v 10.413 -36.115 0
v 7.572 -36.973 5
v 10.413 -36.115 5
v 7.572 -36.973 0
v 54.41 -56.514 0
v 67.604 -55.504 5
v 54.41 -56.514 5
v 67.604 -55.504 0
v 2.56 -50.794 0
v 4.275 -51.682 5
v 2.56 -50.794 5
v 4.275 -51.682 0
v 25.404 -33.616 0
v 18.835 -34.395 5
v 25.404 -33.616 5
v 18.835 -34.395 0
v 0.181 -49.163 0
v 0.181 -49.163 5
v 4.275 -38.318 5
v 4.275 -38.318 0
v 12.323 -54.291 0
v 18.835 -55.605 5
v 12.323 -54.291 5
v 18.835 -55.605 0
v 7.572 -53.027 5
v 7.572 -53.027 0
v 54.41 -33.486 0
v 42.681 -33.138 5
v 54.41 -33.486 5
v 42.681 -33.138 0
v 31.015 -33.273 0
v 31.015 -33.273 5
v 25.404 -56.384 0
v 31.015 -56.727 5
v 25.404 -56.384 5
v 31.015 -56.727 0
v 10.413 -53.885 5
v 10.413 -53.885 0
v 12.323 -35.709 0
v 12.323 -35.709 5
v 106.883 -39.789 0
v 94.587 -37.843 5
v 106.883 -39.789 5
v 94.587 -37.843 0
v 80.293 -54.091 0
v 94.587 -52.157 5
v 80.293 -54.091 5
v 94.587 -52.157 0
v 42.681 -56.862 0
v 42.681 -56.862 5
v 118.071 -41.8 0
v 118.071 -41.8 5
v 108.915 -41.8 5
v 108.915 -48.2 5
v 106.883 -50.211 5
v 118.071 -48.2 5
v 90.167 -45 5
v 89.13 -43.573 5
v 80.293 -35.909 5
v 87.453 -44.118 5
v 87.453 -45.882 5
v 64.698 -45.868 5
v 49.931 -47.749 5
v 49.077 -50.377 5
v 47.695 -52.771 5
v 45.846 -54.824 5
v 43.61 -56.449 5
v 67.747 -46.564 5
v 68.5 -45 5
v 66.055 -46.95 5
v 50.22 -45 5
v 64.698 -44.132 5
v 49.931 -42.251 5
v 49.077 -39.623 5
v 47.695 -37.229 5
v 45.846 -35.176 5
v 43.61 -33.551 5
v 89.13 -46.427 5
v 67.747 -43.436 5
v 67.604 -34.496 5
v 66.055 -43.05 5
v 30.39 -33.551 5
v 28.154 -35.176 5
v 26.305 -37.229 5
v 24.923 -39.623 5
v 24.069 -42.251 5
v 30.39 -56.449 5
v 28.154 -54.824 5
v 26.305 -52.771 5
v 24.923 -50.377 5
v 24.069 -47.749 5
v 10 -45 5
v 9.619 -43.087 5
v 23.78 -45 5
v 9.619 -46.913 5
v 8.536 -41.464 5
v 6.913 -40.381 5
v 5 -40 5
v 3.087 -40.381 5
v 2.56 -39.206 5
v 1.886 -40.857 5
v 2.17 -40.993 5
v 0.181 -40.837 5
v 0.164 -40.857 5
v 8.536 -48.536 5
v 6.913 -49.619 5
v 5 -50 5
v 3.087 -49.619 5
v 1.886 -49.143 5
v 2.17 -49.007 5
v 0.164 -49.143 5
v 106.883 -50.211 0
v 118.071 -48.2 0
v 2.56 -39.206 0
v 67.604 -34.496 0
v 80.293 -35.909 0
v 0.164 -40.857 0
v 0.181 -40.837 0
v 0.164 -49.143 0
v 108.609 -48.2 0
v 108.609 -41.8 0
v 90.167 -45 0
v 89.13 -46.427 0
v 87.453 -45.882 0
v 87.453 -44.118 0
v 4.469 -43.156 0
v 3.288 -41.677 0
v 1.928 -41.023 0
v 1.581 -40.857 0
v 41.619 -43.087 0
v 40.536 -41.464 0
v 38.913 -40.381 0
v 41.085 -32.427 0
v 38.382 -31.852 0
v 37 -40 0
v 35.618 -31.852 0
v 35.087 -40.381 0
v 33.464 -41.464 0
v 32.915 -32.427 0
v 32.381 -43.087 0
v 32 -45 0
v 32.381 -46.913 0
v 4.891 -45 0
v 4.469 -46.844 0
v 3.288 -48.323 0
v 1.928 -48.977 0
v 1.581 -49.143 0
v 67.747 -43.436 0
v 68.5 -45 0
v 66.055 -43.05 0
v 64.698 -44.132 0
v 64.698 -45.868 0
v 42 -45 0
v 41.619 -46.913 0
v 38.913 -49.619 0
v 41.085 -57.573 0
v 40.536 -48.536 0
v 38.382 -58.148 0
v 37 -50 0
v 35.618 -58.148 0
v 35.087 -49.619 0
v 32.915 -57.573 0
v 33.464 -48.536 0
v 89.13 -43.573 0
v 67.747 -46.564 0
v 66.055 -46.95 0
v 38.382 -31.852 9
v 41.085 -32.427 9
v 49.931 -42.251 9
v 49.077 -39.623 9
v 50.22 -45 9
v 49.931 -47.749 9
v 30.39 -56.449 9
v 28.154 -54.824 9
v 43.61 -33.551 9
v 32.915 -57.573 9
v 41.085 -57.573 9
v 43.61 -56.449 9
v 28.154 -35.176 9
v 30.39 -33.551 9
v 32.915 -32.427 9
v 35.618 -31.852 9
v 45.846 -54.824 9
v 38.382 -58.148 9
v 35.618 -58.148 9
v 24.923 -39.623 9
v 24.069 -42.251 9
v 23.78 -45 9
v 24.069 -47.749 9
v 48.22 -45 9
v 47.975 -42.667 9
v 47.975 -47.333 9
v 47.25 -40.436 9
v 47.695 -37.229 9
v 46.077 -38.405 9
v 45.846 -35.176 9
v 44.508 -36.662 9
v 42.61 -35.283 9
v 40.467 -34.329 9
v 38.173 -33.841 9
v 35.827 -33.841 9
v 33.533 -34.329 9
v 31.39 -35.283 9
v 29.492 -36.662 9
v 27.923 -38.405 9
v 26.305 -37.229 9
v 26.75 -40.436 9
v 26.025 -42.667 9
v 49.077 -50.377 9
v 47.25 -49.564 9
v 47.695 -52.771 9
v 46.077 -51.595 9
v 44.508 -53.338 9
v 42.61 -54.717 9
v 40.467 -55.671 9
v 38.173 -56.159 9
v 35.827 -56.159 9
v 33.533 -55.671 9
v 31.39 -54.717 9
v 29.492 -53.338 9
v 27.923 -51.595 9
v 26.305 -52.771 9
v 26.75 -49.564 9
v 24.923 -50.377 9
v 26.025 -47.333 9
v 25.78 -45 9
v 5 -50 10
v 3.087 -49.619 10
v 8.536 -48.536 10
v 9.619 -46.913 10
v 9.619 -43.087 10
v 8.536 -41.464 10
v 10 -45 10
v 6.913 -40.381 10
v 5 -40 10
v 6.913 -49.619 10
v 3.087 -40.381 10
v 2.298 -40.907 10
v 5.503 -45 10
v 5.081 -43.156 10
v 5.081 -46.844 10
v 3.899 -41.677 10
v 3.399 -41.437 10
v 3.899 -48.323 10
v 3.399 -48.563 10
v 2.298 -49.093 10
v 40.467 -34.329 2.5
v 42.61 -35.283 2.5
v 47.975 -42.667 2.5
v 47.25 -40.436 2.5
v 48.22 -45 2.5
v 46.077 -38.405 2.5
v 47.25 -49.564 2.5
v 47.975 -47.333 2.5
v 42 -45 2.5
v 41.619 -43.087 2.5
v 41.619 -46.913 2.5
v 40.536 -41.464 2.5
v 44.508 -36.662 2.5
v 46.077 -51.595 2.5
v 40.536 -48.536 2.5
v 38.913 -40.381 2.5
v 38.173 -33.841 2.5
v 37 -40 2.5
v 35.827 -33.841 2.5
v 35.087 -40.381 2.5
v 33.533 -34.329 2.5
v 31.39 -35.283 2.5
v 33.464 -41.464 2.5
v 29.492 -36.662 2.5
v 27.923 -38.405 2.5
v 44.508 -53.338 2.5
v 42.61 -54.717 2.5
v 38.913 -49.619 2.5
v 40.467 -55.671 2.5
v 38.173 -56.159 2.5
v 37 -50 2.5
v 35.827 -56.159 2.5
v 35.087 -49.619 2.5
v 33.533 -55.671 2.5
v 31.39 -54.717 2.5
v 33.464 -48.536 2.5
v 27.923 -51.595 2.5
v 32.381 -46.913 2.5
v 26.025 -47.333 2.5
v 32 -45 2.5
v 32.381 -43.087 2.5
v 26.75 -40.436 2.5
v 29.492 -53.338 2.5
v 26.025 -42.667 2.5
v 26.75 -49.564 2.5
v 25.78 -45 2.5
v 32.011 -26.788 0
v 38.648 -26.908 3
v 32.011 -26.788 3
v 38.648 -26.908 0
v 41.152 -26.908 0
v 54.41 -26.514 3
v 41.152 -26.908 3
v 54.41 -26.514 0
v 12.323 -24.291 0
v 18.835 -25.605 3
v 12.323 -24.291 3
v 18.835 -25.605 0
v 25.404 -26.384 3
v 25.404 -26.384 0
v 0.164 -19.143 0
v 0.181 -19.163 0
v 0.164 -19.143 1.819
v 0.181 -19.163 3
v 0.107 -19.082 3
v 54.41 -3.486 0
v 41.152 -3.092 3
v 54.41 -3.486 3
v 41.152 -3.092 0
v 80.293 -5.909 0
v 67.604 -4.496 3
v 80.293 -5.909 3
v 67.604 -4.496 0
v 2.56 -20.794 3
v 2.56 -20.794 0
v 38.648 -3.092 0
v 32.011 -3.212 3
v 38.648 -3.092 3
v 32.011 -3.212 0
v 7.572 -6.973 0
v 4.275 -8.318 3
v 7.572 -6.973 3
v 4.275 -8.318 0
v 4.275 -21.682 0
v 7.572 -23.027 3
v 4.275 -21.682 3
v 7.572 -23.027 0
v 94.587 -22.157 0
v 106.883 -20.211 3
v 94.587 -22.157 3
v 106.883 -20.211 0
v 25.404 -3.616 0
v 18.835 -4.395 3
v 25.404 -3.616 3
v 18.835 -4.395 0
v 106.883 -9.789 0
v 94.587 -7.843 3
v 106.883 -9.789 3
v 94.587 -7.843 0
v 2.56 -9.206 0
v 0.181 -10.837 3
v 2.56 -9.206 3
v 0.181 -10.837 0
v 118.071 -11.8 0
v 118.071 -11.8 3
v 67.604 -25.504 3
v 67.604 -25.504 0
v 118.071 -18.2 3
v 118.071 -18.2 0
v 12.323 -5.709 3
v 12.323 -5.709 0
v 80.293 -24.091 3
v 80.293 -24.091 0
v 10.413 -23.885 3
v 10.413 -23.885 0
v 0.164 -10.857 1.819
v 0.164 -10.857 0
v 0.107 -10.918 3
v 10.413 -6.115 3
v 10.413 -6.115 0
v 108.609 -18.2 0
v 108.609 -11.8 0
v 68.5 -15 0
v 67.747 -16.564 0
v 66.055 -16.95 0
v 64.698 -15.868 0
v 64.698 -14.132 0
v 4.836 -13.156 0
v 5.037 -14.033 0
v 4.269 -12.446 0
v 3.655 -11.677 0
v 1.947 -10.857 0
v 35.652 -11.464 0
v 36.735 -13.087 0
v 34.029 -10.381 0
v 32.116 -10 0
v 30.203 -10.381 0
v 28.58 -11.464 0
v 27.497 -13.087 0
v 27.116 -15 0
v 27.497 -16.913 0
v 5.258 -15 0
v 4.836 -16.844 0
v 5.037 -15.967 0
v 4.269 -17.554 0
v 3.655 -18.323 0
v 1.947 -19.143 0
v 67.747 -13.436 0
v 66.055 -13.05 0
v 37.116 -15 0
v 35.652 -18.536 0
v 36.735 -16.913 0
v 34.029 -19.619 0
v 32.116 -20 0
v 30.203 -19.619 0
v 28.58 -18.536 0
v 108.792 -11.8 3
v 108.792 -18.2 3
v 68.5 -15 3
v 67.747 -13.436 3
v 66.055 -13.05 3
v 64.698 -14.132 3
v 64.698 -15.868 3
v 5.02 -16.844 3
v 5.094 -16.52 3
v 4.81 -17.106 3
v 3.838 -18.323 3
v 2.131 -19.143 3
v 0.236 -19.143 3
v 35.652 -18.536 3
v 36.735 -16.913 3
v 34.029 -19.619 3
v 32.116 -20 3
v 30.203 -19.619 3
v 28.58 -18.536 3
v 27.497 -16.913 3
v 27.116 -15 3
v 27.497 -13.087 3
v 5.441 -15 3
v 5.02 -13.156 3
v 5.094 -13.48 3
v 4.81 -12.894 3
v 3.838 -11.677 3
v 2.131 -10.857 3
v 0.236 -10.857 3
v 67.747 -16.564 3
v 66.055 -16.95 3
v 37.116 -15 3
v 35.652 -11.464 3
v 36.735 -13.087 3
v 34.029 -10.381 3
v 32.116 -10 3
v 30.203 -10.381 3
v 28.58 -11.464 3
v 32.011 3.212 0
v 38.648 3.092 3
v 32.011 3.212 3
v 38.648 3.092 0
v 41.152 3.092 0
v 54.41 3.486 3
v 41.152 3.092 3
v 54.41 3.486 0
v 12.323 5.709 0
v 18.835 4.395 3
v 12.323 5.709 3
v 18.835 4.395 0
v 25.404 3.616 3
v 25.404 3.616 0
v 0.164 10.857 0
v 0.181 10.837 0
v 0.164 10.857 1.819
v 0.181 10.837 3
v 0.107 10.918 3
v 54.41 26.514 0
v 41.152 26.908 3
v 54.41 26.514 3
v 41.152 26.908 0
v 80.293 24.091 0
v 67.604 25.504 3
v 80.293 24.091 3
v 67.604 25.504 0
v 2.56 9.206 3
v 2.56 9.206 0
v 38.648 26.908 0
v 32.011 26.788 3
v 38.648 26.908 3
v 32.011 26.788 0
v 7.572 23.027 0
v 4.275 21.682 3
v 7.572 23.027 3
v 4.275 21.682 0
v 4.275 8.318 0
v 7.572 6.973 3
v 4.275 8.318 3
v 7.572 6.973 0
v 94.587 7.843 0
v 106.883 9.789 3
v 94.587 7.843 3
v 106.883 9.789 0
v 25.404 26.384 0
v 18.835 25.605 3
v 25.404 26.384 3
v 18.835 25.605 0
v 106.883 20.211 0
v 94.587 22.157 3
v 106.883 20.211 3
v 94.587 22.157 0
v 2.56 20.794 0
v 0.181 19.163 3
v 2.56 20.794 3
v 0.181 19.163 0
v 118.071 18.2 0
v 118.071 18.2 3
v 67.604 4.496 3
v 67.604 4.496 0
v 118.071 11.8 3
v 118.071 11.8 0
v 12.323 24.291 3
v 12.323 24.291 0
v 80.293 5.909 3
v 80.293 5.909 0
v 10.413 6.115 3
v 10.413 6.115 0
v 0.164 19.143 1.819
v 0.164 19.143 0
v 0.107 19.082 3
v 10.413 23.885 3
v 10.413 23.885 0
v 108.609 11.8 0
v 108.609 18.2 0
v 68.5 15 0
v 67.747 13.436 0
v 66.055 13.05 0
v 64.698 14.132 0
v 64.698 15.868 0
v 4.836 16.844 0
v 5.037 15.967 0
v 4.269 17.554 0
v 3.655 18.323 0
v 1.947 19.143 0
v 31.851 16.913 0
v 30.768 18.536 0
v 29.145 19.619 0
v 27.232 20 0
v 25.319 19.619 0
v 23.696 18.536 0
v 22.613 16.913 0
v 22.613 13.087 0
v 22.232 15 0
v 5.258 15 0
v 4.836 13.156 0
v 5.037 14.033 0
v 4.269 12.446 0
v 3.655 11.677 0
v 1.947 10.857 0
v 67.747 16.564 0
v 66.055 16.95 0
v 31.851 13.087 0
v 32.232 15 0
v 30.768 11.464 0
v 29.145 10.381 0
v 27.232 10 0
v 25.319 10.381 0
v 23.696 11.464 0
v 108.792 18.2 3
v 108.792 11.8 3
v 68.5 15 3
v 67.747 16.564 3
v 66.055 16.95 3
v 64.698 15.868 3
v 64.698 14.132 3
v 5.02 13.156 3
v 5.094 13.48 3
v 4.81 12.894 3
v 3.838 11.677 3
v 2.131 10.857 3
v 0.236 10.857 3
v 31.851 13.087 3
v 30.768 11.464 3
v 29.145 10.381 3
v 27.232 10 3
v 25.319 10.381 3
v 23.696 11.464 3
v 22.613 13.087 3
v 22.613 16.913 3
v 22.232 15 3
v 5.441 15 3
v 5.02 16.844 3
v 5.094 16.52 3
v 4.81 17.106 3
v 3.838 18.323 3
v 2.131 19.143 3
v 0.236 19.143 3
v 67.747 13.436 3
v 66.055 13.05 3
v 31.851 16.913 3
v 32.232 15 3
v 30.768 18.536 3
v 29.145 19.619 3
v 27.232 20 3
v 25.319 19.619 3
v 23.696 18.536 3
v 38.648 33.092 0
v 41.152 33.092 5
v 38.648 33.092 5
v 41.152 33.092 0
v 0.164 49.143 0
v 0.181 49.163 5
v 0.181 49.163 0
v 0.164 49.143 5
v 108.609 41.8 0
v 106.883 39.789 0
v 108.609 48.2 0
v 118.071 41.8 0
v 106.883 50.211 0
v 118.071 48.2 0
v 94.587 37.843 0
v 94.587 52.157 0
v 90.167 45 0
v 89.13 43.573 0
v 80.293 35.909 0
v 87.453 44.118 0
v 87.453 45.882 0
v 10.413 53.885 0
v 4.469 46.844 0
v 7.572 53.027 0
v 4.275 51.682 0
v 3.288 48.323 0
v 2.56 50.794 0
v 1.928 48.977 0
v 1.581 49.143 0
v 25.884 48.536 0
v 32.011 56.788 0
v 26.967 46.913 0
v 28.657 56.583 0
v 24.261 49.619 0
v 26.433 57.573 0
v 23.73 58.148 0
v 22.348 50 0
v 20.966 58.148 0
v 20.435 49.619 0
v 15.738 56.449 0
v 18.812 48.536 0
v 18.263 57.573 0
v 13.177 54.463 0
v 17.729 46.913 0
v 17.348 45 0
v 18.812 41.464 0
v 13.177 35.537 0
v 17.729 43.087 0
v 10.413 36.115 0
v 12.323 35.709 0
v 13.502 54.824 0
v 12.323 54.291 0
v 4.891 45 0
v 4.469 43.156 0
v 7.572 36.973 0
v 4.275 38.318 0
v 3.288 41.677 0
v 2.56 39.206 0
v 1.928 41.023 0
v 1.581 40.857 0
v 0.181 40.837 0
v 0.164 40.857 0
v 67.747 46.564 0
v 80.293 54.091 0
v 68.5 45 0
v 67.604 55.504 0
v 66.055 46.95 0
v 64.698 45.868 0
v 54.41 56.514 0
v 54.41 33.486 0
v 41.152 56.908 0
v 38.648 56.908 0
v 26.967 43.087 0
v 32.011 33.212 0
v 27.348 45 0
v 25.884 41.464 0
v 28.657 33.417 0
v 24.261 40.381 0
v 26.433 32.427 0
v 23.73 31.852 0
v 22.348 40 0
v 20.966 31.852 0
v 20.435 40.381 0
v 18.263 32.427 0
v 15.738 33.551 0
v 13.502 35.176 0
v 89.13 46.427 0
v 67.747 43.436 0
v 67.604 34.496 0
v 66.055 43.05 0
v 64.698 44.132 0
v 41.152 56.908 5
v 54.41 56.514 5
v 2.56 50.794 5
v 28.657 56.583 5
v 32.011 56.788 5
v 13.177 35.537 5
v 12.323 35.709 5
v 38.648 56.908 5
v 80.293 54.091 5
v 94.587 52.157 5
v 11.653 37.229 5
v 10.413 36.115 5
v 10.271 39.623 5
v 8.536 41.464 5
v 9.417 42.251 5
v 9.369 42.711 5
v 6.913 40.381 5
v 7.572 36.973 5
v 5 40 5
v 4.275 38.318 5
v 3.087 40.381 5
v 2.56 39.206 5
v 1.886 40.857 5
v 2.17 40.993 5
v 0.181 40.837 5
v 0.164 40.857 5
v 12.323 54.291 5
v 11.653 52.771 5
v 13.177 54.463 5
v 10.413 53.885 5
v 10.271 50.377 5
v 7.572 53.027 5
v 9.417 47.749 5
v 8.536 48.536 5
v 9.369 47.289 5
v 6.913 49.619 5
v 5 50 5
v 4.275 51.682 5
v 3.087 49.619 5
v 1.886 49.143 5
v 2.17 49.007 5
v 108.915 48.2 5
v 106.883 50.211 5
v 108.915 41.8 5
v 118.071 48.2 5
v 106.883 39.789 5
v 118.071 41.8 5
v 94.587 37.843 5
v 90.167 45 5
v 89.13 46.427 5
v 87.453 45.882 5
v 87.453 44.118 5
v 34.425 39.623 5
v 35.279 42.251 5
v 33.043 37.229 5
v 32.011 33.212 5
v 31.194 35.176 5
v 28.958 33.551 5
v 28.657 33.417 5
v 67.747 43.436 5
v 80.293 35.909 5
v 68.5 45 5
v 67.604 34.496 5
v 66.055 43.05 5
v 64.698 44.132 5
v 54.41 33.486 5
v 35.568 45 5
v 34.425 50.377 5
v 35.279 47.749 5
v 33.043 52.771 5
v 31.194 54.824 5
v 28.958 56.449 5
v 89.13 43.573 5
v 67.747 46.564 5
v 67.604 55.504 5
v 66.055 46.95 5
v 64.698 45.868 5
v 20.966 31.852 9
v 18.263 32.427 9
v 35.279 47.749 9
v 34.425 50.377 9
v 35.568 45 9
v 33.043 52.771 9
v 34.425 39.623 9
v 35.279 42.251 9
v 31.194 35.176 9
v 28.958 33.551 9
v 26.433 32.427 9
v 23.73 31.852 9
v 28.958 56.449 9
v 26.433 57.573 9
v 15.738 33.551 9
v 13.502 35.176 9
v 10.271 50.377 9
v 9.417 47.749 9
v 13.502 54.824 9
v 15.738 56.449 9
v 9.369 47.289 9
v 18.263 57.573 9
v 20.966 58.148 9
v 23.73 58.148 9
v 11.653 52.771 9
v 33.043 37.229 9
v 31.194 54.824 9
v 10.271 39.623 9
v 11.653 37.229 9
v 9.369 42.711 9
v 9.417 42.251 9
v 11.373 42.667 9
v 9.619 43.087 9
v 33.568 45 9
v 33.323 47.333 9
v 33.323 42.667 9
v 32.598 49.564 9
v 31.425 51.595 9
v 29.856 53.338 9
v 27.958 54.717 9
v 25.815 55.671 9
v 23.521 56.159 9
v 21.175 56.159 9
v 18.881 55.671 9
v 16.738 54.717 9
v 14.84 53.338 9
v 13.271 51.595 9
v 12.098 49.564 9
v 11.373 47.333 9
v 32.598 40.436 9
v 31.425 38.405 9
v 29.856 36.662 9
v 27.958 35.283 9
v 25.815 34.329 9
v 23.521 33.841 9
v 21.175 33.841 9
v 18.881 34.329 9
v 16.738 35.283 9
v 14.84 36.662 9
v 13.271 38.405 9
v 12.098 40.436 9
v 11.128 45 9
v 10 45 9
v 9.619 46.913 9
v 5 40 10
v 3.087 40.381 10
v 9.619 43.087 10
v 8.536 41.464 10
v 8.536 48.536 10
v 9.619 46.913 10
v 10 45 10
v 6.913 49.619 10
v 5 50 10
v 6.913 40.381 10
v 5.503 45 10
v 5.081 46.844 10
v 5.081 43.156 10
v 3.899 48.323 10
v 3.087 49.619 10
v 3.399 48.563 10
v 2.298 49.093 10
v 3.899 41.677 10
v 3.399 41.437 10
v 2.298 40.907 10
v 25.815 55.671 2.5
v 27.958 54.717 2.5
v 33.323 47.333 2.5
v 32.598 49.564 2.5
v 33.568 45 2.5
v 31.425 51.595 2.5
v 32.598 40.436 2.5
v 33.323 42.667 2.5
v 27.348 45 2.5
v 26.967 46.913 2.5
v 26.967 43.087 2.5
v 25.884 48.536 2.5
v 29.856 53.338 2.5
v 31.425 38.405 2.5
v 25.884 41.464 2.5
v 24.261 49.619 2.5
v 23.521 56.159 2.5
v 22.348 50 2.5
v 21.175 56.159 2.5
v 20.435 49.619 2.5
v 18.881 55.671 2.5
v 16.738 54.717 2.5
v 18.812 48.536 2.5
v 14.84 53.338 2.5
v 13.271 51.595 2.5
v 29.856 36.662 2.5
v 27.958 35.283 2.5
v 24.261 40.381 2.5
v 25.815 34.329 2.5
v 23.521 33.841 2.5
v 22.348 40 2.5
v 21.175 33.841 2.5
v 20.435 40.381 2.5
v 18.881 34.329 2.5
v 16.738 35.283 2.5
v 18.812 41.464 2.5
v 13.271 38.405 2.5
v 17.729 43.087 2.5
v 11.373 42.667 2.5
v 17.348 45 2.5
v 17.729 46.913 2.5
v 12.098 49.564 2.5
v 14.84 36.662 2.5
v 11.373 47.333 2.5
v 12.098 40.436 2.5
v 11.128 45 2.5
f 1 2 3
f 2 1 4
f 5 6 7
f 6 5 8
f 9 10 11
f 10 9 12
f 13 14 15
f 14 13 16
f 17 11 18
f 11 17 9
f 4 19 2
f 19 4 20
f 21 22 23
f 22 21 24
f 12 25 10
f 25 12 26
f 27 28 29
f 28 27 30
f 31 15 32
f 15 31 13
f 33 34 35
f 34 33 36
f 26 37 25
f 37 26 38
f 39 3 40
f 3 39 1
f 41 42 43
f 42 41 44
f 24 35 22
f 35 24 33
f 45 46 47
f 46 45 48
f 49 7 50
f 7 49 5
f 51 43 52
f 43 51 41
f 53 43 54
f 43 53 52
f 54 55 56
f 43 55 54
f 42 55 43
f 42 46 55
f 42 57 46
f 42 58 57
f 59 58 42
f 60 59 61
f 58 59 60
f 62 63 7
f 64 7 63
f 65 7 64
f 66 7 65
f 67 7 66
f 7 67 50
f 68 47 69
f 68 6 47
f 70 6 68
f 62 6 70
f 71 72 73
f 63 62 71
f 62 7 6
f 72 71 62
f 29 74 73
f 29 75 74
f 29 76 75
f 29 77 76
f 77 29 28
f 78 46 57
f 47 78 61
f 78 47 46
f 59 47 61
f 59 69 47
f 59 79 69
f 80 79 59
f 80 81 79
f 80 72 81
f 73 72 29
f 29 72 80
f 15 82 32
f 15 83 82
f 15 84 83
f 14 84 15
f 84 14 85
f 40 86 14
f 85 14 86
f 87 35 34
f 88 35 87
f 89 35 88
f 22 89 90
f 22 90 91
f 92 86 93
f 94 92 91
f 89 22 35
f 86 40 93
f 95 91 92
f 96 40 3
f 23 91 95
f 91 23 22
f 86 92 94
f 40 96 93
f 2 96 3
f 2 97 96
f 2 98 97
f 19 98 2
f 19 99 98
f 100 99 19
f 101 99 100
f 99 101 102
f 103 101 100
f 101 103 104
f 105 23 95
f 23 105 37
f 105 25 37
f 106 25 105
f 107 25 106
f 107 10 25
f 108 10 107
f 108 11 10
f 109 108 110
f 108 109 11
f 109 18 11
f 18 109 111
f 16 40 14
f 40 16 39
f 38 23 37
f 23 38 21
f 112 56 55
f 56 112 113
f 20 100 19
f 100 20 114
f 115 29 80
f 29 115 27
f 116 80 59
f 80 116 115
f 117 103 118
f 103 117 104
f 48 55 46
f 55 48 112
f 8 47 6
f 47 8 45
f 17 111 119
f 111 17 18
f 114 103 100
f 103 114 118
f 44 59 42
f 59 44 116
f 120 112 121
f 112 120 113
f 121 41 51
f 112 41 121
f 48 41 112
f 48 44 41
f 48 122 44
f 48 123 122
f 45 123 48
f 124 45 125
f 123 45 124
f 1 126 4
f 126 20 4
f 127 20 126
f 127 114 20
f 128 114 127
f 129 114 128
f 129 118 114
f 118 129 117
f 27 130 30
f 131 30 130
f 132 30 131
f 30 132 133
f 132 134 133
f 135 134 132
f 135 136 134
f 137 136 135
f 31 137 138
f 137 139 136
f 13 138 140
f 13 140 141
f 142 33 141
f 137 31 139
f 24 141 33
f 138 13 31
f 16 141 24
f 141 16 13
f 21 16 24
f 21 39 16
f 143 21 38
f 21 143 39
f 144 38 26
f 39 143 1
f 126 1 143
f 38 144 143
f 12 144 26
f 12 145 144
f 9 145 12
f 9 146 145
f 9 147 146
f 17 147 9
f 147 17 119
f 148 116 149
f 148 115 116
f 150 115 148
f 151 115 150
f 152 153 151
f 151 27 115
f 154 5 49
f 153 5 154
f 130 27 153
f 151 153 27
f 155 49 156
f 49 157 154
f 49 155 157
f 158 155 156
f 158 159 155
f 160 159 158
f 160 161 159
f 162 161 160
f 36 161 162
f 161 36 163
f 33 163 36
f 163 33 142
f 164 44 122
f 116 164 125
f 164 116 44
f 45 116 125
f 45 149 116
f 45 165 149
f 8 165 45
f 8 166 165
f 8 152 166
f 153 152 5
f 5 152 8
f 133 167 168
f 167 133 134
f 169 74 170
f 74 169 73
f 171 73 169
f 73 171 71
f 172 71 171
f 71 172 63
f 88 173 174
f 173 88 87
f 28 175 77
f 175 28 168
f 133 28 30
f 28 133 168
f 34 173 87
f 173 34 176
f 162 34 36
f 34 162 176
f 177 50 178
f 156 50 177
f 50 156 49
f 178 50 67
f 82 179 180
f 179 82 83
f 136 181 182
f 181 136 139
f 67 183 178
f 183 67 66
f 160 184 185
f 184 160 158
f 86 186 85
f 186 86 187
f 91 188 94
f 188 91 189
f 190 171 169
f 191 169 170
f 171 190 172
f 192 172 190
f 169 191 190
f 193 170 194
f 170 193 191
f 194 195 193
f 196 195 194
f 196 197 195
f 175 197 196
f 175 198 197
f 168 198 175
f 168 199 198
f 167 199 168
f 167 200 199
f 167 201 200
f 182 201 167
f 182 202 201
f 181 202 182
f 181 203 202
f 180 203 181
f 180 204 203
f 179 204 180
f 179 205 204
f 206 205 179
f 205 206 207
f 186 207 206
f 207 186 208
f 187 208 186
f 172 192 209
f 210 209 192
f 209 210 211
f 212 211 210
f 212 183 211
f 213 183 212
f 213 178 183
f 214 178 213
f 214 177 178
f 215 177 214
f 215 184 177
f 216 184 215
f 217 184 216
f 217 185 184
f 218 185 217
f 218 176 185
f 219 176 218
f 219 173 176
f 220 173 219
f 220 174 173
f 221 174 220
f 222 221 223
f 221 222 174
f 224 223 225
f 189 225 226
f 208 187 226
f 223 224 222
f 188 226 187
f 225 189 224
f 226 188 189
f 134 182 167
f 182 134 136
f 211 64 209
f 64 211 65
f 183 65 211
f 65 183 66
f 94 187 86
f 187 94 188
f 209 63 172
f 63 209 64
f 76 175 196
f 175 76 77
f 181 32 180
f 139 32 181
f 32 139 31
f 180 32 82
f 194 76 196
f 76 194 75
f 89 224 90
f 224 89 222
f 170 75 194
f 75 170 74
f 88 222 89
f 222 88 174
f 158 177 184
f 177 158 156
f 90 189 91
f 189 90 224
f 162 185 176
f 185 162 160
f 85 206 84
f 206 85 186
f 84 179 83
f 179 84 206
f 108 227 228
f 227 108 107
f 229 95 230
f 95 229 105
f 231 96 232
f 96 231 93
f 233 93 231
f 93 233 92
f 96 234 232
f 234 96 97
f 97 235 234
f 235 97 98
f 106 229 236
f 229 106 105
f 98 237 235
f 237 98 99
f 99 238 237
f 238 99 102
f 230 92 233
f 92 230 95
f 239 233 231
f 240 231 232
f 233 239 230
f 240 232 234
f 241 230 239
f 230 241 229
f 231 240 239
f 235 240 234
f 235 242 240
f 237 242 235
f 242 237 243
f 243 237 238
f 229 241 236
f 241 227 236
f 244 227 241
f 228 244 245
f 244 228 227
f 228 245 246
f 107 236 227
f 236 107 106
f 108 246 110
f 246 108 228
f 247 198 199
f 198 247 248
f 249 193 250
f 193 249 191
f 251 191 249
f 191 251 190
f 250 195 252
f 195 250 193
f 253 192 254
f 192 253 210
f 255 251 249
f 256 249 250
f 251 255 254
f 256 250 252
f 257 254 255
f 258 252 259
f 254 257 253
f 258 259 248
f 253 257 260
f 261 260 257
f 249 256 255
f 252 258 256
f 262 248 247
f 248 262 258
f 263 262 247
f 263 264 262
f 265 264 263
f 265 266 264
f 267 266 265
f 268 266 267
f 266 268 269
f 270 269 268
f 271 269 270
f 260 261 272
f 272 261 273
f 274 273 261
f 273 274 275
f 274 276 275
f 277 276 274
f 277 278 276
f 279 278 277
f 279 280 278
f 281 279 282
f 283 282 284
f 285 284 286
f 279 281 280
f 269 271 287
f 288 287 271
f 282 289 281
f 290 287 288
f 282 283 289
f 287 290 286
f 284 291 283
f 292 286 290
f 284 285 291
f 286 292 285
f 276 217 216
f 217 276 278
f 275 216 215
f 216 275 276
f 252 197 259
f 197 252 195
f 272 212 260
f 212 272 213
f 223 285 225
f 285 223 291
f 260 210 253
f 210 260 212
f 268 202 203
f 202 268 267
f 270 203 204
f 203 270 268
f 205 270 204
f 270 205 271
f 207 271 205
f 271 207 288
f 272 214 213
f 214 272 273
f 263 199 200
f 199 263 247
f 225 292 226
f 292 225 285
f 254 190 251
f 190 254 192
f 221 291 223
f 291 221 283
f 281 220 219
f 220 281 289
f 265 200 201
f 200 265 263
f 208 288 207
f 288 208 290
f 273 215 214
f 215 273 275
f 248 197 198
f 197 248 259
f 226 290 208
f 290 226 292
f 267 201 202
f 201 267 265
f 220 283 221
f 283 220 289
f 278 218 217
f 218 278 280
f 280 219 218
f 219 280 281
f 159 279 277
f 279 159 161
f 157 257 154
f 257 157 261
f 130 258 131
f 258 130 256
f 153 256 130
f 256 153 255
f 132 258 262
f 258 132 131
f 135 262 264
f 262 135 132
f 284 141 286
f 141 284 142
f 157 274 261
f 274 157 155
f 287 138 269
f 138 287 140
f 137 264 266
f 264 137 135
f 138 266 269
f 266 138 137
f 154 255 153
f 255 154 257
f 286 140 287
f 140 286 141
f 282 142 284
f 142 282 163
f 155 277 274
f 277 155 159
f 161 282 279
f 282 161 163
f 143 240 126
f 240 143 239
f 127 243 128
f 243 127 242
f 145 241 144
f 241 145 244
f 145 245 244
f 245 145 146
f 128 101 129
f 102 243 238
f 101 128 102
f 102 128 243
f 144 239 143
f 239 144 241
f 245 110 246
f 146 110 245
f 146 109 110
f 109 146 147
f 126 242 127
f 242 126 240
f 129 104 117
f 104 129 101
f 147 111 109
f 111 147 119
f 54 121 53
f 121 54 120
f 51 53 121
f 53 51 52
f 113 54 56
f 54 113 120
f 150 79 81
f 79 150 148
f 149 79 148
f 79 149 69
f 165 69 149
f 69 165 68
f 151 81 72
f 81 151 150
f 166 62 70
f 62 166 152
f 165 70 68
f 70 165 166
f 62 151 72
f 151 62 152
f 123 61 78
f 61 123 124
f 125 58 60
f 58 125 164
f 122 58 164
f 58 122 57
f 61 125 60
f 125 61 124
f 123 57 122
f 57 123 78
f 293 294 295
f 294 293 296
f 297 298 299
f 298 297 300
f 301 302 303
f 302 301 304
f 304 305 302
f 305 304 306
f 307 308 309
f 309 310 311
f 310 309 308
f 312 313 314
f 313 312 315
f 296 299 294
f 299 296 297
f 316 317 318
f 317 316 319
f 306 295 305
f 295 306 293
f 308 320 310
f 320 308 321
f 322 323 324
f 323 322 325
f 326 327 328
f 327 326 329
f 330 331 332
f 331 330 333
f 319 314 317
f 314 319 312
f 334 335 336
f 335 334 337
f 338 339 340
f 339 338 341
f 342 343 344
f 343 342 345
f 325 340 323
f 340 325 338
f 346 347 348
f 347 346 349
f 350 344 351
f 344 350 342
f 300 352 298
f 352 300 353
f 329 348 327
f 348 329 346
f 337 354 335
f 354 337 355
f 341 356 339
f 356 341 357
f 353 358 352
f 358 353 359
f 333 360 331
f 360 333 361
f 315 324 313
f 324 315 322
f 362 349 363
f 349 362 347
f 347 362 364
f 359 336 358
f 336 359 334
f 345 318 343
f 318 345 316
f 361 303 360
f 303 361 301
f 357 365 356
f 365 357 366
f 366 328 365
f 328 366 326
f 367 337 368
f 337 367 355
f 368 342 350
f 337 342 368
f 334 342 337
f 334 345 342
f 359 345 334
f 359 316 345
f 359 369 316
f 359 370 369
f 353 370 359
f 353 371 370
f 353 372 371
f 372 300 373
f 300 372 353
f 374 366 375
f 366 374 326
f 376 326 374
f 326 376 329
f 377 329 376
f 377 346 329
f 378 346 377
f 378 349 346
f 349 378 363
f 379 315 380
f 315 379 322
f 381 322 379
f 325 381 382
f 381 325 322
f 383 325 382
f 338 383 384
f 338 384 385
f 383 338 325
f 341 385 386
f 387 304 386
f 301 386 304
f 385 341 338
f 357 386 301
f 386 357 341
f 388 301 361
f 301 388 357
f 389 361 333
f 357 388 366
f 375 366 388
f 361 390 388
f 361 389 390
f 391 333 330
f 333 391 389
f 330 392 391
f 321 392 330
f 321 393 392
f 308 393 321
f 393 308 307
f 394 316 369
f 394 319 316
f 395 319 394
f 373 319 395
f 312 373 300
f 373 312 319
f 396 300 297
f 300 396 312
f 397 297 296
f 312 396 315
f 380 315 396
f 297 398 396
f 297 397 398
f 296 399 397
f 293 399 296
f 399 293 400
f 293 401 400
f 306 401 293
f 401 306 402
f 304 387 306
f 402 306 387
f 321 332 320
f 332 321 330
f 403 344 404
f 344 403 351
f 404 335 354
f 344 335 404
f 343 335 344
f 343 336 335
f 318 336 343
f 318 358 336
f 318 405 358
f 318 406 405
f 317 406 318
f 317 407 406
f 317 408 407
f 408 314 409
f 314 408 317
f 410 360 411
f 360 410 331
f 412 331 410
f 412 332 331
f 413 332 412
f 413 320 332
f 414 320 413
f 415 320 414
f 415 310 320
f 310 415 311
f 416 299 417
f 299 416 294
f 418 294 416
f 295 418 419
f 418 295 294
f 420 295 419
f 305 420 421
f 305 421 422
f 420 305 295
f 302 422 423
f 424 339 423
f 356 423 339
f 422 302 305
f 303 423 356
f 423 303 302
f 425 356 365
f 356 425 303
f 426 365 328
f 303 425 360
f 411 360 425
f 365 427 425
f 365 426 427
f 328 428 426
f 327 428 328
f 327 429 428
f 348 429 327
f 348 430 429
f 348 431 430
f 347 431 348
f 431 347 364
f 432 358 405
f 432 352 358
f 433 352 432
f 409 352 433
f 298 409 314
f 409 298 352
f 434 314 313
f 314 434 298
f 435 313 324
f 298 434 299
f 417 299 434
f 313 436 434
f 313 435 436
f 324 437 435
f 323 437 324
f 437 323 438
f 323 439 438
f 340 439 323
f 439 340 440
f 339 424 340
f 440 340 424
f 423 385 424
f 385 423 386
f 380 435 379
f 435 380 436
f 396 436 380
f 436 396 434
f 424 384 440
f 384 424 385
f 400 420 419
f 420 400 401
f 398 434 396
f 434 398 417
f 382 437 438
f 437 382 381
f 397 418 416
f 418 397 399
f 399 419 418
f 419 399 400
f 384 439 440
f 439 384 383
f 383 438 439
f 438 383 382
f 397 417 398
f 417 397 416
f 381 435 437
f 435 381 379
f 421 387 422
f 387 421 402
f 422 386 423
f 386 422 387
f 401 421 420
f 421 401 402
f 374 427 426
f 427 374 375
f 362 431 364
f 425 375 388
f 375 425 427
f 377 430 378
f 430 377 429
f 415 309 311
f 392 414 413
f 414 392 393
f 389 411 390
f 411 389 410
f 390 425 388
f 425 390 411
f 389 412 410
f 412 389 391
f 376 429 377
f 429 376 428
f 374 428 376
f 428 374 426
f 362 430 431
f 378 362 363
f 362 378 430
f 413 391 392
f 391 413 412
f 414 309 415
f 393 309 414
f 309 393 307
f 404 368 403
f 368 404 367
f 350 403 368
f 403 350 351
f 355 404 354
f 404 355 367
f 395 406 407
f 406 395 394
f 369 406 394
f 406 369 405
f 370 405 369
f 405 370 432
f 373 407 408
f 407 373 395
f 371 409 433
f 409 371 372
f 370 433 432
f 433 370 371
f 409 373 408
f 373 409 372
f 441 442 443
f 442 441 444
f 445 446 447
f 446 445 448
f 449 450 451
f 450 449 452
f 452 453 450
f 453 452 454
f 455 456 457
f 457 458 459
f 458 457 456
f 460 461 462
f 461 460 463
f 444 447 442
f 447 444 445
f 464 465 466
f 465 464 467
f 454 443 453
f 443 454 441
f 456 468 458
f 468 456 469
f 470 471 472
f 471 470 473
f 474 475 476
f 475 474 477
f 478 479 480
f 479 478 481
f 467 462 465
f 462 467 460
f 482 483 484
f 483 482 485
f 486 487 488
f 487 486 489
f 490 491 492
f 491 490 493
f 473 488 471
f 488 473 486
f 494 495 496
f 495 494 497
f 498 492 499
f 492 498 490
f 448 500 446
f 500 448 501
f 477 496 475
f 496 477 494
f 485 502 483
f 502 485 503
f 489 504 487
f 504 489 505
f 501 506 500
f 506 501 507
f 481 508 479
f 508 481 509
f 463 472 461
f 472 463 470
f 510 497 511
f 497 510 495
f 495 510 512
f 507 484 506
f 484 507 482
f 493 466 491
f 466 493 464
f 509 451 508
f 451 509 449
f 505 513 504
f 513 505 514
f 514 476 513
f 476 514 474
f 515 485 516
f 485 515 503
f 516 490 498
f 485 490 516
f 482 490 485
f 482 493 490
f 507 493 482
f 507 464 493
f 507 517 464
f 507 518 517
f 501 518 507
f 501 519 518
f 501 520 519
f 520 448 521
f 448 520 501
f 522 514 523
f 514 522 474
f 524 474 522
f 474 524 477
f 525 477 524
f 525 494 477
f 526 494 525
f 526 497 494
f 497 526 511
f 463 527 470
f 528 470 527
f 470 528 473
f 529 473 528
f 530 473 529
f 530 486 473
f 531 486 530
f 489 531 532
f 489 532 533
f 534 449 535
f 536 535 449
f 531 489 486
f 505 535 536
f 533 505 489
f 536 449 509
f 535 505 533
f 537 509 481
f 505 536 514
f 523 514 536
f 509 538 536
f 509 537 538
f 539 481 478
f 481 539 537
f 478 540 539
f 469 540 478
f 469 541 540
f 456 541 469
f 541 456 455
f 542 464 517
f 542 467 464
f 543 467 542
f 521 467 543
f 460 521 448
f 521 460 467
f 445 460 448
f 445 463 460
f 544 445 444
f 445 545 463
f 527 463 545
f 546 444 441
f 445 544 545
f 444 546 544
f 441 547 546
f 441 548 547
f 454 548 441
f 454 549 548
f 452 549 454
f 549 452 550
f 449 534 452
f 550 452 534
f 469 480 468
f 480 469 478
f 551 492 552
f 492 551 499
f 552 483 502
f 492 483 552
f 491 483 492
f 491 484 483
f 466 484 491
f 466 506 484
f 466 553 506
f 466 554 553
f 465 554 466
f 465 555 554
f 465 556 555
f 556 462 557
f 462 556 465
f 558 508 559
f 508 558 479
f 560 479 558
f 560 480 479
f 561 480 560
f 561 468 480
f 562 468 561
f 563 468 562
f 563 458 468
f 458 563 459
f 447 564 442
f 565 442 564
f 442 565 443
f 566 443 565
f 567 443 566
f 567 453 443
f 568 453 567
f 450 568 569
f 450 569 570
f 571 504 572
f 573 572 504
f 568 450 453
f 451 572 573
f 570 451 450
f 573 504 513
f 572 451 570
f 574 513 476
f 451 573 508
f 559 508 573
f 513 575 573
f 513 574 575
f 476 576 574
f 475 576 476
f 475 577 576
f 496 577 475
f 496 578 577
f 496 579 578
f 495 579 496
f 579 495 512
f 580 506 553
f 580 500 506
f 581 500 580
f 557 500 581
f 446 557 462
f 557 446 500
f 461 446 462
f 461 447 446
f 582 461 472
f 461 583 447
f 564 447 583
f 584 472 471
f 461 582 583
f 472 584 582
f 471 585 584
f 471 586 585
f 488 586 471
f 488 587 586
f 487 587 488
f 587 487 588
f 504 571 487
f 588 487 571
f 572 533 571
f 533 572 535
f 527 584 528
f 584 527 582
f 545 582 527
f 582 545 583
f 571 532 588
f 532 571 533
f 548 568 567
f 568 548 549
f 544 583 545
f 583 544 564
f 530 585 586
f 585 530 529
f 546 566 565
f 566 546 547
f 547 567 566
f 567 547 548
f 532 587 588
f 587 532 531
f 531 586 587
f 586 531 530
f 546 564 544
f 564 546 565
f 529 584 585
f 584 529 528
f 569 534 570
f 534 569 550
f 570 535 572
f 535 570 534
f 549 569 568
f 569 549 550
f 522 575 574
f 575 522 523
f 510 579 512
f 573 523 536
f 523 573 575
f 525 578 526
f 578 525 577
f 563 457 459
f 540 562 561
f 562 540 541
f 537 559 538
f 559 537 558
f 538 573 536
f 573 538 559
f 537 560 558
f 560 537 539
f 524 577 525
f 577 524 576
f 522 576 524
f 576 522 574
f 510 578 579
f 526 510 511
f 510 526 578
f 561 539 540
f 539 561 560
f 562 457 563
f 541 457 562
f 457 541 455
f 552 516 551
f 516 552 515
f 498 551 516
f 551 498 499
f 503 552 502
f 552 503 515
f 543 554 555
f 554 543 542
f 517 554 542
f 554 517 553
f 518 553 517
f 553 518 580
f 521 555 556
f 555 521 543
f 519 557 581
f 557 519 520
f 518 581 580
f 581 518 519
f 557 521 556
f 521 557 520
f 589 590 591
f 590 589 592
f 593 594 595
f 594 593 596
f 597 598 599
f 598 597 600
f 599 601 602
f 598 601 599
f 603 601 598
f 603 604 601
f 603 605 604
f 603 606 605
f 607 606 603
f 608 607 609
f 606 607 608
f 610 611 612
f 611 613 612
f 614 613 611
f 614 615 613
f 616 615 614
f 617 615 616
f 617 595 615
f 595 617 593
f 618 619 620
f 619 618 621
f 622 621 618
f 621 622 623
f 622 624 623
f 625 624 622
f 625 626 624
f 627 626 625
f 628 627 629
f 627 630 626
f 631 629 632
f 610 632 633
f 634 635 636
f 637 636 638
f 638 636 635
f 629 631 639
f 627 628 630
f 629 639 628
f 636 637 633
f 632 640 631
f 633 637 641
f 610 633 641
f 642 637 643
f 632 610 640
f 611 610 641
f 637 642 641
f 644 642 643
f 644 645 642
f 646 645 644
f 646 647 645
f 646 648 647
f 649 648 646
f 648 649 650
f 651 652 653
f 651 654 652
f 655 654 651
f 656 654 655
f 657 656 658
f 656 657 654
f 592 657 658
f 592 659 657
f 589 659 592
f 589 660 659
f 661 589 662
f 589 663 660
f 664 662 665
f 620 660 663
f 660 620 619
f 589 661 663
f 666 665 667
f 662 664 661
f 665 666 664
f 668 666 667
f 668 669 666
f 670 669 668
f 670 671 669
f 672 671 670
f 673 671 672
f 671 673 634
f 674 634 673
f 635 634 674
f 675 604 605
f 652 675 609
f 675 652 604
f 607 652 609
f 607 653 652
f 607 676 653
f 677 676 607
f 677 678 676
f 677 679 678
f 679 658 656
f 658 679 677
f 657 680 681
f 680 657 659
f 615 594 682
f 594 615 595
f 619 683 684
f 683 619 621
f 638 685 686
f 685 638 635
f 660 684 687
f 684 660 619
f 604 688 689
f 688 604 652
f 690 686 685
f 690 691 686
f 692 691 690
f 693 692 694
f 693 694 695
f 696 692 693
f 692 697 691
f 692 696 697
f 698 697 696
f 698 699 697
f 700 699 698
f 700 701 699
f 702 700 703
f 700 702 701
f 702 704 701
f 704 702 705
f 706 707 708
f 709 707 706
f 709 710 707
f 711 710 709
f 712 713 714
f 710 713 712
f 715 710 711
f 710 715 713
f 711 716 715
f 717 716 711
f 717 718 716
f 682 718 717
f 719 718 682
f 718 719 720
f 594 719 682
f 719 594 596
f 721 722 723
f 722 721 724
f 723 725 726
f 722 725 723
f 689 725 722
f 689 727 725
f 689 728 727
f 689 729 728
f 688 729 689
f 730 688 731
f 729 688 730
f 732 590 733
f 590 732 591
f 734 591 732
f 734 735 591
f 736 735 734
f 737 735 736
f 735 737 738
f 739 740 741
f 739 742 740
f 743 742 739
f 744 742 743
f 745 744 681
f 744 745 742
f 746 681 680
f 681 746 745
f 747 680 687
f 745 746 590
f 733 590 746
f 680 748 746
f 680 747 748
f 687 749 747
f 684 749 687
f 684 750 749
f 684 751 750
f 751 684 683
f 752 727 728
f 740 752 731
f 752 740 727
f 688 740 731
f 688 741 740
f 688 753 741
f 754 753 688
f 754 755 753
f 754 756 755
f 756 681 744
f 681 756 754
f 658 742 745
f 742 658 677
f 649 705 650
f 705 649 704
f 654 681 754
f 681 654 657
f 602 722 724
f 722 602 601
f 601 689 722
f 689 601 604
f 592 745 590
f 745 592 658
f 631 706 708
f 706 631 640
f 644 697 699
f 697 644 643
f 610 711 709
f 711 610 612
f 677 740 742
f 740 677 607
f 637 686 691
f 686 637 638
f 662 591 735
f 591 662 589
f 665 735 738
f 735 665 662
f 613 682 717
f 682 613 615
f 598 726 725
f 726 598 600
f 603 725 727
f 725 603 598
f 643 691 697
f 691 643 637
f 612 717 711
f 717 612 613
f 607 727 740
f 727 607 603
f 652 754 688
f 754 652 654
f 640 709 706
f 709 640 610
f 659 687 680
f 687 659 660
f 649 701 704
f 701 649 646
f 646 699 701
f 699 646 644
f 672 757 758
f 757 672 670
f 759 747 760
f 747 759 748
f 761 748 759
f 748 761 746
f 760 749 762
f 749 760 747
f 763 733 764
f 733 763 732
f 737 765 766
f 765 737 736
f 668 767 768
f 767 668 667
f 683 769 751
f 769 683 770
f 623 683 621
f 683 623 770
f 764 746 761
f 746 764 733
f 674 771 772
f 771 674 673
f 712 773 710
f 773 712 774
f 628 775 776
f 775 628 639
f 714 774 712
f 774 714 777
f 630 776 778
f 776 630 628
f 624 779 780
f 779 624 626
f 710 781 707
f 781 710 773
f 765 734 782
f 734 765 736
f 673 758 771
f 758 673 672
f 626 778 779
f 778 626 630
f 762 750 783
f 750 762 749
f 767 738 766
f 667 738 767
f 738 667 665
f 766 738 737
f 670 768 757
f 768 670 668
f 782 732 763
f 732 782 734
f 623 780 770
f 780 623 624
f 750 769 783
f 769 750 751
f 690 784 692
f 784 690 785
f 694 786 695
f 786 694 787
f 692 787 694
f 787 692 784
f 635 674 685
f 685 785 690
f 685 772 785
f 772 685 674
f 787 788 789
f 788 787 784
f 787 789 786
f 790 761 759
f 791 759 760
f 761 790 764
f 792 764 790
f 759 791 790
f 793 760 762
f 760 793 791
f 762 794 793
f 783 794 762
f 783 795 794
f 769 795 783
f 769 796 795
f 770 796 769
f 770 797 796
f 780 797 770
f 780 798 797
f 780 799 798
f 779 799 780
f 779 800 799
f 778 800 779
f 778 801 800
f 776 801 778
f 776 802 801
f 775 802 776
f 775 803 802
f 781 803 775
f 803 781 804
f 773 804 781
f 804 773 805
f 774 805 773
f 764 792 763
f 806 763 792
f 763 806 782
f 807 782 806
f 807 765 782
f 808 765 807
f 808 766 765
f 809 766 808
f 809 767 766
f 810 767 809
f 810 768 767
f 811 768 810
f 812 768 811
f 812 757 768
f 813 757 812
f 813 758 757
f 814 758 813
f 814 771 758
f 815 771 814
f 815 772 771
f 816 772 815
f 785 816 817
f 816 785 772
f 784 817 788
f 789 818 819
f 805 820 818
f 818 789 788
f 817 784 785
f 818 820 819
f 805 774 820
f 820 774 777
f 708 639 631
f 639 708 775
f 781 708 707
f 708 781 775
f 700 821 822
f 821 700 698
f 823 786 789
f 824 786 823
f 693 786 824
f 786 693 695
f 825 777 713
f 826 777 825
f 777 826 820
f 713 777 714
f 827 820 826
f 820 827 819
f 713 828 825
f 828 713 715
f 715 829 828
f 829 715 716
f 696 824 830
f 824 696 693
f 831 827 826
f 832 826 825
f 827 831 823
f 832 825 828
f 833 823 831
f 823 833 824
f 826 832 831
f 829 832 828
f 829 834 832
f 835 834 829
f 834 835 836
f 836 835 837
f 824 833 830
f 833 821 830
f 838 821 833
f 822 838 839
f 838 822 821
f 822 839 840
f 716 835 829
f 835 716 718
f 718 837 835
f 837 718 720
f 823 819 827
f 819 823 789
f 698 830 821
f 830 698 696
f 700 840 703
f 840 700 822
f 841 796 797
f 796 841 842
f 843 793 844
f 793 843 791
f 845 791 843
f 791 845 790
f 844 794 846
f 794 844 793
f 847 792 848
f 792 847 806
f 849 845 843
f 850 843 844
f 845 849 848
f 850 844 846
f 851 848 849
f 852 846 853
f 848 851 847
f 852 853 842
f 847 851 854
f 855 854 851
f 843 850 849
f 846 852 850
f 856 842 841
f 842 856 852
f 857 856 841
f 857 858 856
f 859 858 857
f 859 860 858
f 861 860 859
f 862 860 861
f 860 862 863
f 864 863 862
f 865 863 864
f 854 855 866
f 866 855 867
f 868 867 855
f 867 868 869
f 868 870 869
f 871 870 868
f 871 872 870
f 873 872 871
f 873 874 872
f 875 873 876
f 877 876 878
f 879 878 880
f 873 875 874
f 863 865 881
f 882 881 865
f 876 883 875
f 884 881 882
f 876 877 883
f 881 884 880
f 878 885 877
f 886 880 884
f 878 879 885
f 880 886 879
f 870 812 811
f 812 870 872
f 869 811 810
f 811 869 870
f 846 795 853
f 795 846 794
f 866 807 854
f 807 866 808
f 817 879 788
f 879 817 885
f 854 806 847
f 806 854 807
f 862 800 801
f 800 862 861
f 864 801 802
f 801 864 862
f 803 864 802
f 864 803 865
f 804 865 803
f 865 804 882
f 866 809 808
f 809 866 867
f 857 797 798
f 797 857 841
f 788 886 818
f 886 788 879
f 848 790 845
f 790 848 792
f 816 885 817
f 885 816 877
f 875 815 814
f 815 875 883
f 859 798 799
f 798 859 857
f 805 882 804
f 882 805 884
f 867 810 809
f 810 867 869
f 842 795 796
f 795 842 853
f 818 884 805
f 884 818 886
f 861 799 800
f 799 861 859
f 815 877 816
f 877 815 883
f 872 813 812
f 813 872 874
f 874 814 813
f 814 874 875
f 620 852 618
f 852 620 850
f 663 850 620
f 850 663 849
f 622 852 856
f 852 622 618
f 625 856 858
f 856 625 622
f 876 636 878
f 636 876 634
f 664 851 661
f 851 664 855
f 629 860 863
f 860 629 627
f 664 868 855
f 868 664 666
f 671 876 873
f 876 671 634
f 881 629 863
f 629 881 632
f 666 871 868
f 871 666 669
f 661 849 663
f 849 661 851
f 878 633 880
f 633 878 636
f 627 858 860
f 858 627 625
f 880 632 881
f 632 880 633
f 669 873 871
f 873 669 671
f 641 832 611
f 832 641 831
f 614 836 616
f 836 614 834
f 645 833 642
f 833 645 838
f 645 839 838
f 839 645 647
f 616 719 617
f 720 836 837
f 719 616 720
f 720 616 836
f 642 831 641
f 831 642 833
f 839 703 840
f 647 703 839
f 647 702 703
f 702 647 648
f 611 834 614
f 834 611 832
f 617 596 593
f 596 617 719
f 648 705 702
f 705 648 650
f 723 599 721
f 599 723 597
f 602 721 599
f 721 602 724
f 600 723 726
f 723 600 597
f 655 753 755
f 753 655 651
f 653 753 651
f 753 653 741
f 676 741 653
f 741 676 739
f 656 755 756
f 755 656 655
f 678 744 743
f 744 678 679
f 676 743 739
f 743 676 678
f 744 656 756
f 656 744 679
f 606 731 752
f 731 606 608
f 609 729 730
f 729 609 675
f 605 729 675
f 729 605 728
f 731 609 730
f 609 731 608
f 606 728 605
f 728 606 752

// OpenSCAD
// file: naca0018.scad
module naca0018(chord, height)
{
  hull() {
    translate([0.000000 * chord,0,0]) cylinder(r = 0.000000 * chord, h = height);
    translate([0.012500 * chord,0,0]) cylinder(r = 0.028409 * chord, h = height);
    translate([0.025000 * chord,0,0]) cylinder(r = 0.039221 * chord, h = height);
    translate([0.050000 * chord,0,0]) cylinder(r = 0.053320 * chord, h = height);
    translate([0.075000 * chord,0,0]) cylinder(r = 0.062999 * chord, h = height);
    translate([0.100000 * chord,0,0]) cylinder(r = 0.070242 * chord, h = height);
    translate([0.150000 * chord,0,0]) cylinder(r = 0.080177 * chord, h = height);
    translate([0.200000 * chord,0,0]) cylinder(r = 0.086063 * chord, h = height);
    translate([0.250000 * chord,0,0]) cylinder(r = 0.089119 * chord, h = height);
    translate([0.300000 * chord,0,0]) cylinder(r = 0.090026 * chord, h = height);
    translate([0.400000 * chord,0,0]) cylinder(r = 0.087045 * chord, h = height);
    translate([0.500000 * chord,0,0]) cylinder(r = 0.079410 * chord, h = height);
    translate([0.600000 * chord,0,0]) cylinder(r = 0.068451 * chord, h = height);
    translate([0.700000 * chord,0,0]) cylinder(r = 0.054959 * chord, h = height);
    translate([0.800000 * chord,0,0]) cylinder(r = 0.039347 * chord, h = height);
    translate([0.900000 * chord,0,0]) cylinder(r = 0.021716 * chord, h = height);
    translate([0.950000 * chord,0,0]) cylinder(r = 0.012098 * chord, h = height);
    translate([1.000000 * chord,0,0]) cylinder(r = 0.001890 * chord, h = height);
  }
}

naca0018(100, 3);
// file: constants.scad
/*
 * Written by Dermot Tynan, Kalopa Research.
 * GPLv2.
 *
 * This file has all the constants for the OpenWing sail.
 *
 * All dimensions are in mm.
 */

bearing_inner_radius = 4.0;
bearing_outer_radius = 11.0 * 1.02;
bearing_height = 7.0;

mast_clearance_radius = 5.0;

a_section_chord = 133.0;

le_tube_radius = 4.0 * 1.0625;

te_depth = 6.4;
te_width = 20.0;
// main file
/*
 * Written by Dermot Tynan, Kalopa Research.
 * GPLv2.
 *
 * This is the definition for the four mast supports on the lower
 * leading-edge of the mast, A0 -> A3.
 *
 * All dimensions are in mm.
 */
include <constants.scad>

use <naca0018.scad>

module skate_bearing()
{
	difference() {
		cylinder(r = bearing_outer_radius, h = bearing_height, center = true);
		cylinder(r = bearing_inner_radius, h = bearing_height + 2, center = true);
	}
}

module mast_support_1(off)
{
	difference() {
		union() {
			naca0018(a_section_chord, 5);
			translate([off, 0, 4.5]) cylinder(r = bearing_outer_radius + 2.0, h = 9, center = true);
			translate([5, 0, 6]) cylinder(r = 5, h = 8, center = true);
		}
		translate([off, 0, 6]) skate_bearing();
		translate([off, 0, 0]) cylinder(r = mast_clearance_radius, h = 20, center = true);
		translate([1, 0, 6]) rotate(a = [0, 3.5, 0]) cylinder(r = le_tube_radius, h = 20, center = true);
		translate([122, 0, 6]) rotate(a = [0, 3.5, 0]) cube([26, te_depth, 20], center = true);
		translate([a_section_chord / 2, 0, 0]) cylinder(r = 2, h = 12, center = true);
		translate([a_section_chord * 2 / 3, 0, 0]) cylinder(r = 1.5, h = 12, center = true);
	}
}

module mast_support_2(off)
{
	difference() {
		naca0018(a_section_chord, 3);
		translate([off, 0, 0]) cylinder(r = mast_clearance_radius, h = 10, center = true);
		translate([1, 0, 0]) rotate(a = [0, 3.5, 0]) cylinder(r = le_tube_radius, h = 10, center = true);
		translate([122, 0, 6]) rotate(a = [0, 3.5, 0]) cube([26, te_depth, 20], center = true);
		translate([a_section_chord / 2, 0, 0]) cylinder(r = 2, h = 12, center = true);
	}
}

translate([0, -45, 0]) mast_support_1(37);
translate([0, -15, 0]) mast_support_2(32.116);
translate([0, 15, 0]) mast_support_2(27.232);
translate([0, 45, 0]) mast_support_1(22.348);
